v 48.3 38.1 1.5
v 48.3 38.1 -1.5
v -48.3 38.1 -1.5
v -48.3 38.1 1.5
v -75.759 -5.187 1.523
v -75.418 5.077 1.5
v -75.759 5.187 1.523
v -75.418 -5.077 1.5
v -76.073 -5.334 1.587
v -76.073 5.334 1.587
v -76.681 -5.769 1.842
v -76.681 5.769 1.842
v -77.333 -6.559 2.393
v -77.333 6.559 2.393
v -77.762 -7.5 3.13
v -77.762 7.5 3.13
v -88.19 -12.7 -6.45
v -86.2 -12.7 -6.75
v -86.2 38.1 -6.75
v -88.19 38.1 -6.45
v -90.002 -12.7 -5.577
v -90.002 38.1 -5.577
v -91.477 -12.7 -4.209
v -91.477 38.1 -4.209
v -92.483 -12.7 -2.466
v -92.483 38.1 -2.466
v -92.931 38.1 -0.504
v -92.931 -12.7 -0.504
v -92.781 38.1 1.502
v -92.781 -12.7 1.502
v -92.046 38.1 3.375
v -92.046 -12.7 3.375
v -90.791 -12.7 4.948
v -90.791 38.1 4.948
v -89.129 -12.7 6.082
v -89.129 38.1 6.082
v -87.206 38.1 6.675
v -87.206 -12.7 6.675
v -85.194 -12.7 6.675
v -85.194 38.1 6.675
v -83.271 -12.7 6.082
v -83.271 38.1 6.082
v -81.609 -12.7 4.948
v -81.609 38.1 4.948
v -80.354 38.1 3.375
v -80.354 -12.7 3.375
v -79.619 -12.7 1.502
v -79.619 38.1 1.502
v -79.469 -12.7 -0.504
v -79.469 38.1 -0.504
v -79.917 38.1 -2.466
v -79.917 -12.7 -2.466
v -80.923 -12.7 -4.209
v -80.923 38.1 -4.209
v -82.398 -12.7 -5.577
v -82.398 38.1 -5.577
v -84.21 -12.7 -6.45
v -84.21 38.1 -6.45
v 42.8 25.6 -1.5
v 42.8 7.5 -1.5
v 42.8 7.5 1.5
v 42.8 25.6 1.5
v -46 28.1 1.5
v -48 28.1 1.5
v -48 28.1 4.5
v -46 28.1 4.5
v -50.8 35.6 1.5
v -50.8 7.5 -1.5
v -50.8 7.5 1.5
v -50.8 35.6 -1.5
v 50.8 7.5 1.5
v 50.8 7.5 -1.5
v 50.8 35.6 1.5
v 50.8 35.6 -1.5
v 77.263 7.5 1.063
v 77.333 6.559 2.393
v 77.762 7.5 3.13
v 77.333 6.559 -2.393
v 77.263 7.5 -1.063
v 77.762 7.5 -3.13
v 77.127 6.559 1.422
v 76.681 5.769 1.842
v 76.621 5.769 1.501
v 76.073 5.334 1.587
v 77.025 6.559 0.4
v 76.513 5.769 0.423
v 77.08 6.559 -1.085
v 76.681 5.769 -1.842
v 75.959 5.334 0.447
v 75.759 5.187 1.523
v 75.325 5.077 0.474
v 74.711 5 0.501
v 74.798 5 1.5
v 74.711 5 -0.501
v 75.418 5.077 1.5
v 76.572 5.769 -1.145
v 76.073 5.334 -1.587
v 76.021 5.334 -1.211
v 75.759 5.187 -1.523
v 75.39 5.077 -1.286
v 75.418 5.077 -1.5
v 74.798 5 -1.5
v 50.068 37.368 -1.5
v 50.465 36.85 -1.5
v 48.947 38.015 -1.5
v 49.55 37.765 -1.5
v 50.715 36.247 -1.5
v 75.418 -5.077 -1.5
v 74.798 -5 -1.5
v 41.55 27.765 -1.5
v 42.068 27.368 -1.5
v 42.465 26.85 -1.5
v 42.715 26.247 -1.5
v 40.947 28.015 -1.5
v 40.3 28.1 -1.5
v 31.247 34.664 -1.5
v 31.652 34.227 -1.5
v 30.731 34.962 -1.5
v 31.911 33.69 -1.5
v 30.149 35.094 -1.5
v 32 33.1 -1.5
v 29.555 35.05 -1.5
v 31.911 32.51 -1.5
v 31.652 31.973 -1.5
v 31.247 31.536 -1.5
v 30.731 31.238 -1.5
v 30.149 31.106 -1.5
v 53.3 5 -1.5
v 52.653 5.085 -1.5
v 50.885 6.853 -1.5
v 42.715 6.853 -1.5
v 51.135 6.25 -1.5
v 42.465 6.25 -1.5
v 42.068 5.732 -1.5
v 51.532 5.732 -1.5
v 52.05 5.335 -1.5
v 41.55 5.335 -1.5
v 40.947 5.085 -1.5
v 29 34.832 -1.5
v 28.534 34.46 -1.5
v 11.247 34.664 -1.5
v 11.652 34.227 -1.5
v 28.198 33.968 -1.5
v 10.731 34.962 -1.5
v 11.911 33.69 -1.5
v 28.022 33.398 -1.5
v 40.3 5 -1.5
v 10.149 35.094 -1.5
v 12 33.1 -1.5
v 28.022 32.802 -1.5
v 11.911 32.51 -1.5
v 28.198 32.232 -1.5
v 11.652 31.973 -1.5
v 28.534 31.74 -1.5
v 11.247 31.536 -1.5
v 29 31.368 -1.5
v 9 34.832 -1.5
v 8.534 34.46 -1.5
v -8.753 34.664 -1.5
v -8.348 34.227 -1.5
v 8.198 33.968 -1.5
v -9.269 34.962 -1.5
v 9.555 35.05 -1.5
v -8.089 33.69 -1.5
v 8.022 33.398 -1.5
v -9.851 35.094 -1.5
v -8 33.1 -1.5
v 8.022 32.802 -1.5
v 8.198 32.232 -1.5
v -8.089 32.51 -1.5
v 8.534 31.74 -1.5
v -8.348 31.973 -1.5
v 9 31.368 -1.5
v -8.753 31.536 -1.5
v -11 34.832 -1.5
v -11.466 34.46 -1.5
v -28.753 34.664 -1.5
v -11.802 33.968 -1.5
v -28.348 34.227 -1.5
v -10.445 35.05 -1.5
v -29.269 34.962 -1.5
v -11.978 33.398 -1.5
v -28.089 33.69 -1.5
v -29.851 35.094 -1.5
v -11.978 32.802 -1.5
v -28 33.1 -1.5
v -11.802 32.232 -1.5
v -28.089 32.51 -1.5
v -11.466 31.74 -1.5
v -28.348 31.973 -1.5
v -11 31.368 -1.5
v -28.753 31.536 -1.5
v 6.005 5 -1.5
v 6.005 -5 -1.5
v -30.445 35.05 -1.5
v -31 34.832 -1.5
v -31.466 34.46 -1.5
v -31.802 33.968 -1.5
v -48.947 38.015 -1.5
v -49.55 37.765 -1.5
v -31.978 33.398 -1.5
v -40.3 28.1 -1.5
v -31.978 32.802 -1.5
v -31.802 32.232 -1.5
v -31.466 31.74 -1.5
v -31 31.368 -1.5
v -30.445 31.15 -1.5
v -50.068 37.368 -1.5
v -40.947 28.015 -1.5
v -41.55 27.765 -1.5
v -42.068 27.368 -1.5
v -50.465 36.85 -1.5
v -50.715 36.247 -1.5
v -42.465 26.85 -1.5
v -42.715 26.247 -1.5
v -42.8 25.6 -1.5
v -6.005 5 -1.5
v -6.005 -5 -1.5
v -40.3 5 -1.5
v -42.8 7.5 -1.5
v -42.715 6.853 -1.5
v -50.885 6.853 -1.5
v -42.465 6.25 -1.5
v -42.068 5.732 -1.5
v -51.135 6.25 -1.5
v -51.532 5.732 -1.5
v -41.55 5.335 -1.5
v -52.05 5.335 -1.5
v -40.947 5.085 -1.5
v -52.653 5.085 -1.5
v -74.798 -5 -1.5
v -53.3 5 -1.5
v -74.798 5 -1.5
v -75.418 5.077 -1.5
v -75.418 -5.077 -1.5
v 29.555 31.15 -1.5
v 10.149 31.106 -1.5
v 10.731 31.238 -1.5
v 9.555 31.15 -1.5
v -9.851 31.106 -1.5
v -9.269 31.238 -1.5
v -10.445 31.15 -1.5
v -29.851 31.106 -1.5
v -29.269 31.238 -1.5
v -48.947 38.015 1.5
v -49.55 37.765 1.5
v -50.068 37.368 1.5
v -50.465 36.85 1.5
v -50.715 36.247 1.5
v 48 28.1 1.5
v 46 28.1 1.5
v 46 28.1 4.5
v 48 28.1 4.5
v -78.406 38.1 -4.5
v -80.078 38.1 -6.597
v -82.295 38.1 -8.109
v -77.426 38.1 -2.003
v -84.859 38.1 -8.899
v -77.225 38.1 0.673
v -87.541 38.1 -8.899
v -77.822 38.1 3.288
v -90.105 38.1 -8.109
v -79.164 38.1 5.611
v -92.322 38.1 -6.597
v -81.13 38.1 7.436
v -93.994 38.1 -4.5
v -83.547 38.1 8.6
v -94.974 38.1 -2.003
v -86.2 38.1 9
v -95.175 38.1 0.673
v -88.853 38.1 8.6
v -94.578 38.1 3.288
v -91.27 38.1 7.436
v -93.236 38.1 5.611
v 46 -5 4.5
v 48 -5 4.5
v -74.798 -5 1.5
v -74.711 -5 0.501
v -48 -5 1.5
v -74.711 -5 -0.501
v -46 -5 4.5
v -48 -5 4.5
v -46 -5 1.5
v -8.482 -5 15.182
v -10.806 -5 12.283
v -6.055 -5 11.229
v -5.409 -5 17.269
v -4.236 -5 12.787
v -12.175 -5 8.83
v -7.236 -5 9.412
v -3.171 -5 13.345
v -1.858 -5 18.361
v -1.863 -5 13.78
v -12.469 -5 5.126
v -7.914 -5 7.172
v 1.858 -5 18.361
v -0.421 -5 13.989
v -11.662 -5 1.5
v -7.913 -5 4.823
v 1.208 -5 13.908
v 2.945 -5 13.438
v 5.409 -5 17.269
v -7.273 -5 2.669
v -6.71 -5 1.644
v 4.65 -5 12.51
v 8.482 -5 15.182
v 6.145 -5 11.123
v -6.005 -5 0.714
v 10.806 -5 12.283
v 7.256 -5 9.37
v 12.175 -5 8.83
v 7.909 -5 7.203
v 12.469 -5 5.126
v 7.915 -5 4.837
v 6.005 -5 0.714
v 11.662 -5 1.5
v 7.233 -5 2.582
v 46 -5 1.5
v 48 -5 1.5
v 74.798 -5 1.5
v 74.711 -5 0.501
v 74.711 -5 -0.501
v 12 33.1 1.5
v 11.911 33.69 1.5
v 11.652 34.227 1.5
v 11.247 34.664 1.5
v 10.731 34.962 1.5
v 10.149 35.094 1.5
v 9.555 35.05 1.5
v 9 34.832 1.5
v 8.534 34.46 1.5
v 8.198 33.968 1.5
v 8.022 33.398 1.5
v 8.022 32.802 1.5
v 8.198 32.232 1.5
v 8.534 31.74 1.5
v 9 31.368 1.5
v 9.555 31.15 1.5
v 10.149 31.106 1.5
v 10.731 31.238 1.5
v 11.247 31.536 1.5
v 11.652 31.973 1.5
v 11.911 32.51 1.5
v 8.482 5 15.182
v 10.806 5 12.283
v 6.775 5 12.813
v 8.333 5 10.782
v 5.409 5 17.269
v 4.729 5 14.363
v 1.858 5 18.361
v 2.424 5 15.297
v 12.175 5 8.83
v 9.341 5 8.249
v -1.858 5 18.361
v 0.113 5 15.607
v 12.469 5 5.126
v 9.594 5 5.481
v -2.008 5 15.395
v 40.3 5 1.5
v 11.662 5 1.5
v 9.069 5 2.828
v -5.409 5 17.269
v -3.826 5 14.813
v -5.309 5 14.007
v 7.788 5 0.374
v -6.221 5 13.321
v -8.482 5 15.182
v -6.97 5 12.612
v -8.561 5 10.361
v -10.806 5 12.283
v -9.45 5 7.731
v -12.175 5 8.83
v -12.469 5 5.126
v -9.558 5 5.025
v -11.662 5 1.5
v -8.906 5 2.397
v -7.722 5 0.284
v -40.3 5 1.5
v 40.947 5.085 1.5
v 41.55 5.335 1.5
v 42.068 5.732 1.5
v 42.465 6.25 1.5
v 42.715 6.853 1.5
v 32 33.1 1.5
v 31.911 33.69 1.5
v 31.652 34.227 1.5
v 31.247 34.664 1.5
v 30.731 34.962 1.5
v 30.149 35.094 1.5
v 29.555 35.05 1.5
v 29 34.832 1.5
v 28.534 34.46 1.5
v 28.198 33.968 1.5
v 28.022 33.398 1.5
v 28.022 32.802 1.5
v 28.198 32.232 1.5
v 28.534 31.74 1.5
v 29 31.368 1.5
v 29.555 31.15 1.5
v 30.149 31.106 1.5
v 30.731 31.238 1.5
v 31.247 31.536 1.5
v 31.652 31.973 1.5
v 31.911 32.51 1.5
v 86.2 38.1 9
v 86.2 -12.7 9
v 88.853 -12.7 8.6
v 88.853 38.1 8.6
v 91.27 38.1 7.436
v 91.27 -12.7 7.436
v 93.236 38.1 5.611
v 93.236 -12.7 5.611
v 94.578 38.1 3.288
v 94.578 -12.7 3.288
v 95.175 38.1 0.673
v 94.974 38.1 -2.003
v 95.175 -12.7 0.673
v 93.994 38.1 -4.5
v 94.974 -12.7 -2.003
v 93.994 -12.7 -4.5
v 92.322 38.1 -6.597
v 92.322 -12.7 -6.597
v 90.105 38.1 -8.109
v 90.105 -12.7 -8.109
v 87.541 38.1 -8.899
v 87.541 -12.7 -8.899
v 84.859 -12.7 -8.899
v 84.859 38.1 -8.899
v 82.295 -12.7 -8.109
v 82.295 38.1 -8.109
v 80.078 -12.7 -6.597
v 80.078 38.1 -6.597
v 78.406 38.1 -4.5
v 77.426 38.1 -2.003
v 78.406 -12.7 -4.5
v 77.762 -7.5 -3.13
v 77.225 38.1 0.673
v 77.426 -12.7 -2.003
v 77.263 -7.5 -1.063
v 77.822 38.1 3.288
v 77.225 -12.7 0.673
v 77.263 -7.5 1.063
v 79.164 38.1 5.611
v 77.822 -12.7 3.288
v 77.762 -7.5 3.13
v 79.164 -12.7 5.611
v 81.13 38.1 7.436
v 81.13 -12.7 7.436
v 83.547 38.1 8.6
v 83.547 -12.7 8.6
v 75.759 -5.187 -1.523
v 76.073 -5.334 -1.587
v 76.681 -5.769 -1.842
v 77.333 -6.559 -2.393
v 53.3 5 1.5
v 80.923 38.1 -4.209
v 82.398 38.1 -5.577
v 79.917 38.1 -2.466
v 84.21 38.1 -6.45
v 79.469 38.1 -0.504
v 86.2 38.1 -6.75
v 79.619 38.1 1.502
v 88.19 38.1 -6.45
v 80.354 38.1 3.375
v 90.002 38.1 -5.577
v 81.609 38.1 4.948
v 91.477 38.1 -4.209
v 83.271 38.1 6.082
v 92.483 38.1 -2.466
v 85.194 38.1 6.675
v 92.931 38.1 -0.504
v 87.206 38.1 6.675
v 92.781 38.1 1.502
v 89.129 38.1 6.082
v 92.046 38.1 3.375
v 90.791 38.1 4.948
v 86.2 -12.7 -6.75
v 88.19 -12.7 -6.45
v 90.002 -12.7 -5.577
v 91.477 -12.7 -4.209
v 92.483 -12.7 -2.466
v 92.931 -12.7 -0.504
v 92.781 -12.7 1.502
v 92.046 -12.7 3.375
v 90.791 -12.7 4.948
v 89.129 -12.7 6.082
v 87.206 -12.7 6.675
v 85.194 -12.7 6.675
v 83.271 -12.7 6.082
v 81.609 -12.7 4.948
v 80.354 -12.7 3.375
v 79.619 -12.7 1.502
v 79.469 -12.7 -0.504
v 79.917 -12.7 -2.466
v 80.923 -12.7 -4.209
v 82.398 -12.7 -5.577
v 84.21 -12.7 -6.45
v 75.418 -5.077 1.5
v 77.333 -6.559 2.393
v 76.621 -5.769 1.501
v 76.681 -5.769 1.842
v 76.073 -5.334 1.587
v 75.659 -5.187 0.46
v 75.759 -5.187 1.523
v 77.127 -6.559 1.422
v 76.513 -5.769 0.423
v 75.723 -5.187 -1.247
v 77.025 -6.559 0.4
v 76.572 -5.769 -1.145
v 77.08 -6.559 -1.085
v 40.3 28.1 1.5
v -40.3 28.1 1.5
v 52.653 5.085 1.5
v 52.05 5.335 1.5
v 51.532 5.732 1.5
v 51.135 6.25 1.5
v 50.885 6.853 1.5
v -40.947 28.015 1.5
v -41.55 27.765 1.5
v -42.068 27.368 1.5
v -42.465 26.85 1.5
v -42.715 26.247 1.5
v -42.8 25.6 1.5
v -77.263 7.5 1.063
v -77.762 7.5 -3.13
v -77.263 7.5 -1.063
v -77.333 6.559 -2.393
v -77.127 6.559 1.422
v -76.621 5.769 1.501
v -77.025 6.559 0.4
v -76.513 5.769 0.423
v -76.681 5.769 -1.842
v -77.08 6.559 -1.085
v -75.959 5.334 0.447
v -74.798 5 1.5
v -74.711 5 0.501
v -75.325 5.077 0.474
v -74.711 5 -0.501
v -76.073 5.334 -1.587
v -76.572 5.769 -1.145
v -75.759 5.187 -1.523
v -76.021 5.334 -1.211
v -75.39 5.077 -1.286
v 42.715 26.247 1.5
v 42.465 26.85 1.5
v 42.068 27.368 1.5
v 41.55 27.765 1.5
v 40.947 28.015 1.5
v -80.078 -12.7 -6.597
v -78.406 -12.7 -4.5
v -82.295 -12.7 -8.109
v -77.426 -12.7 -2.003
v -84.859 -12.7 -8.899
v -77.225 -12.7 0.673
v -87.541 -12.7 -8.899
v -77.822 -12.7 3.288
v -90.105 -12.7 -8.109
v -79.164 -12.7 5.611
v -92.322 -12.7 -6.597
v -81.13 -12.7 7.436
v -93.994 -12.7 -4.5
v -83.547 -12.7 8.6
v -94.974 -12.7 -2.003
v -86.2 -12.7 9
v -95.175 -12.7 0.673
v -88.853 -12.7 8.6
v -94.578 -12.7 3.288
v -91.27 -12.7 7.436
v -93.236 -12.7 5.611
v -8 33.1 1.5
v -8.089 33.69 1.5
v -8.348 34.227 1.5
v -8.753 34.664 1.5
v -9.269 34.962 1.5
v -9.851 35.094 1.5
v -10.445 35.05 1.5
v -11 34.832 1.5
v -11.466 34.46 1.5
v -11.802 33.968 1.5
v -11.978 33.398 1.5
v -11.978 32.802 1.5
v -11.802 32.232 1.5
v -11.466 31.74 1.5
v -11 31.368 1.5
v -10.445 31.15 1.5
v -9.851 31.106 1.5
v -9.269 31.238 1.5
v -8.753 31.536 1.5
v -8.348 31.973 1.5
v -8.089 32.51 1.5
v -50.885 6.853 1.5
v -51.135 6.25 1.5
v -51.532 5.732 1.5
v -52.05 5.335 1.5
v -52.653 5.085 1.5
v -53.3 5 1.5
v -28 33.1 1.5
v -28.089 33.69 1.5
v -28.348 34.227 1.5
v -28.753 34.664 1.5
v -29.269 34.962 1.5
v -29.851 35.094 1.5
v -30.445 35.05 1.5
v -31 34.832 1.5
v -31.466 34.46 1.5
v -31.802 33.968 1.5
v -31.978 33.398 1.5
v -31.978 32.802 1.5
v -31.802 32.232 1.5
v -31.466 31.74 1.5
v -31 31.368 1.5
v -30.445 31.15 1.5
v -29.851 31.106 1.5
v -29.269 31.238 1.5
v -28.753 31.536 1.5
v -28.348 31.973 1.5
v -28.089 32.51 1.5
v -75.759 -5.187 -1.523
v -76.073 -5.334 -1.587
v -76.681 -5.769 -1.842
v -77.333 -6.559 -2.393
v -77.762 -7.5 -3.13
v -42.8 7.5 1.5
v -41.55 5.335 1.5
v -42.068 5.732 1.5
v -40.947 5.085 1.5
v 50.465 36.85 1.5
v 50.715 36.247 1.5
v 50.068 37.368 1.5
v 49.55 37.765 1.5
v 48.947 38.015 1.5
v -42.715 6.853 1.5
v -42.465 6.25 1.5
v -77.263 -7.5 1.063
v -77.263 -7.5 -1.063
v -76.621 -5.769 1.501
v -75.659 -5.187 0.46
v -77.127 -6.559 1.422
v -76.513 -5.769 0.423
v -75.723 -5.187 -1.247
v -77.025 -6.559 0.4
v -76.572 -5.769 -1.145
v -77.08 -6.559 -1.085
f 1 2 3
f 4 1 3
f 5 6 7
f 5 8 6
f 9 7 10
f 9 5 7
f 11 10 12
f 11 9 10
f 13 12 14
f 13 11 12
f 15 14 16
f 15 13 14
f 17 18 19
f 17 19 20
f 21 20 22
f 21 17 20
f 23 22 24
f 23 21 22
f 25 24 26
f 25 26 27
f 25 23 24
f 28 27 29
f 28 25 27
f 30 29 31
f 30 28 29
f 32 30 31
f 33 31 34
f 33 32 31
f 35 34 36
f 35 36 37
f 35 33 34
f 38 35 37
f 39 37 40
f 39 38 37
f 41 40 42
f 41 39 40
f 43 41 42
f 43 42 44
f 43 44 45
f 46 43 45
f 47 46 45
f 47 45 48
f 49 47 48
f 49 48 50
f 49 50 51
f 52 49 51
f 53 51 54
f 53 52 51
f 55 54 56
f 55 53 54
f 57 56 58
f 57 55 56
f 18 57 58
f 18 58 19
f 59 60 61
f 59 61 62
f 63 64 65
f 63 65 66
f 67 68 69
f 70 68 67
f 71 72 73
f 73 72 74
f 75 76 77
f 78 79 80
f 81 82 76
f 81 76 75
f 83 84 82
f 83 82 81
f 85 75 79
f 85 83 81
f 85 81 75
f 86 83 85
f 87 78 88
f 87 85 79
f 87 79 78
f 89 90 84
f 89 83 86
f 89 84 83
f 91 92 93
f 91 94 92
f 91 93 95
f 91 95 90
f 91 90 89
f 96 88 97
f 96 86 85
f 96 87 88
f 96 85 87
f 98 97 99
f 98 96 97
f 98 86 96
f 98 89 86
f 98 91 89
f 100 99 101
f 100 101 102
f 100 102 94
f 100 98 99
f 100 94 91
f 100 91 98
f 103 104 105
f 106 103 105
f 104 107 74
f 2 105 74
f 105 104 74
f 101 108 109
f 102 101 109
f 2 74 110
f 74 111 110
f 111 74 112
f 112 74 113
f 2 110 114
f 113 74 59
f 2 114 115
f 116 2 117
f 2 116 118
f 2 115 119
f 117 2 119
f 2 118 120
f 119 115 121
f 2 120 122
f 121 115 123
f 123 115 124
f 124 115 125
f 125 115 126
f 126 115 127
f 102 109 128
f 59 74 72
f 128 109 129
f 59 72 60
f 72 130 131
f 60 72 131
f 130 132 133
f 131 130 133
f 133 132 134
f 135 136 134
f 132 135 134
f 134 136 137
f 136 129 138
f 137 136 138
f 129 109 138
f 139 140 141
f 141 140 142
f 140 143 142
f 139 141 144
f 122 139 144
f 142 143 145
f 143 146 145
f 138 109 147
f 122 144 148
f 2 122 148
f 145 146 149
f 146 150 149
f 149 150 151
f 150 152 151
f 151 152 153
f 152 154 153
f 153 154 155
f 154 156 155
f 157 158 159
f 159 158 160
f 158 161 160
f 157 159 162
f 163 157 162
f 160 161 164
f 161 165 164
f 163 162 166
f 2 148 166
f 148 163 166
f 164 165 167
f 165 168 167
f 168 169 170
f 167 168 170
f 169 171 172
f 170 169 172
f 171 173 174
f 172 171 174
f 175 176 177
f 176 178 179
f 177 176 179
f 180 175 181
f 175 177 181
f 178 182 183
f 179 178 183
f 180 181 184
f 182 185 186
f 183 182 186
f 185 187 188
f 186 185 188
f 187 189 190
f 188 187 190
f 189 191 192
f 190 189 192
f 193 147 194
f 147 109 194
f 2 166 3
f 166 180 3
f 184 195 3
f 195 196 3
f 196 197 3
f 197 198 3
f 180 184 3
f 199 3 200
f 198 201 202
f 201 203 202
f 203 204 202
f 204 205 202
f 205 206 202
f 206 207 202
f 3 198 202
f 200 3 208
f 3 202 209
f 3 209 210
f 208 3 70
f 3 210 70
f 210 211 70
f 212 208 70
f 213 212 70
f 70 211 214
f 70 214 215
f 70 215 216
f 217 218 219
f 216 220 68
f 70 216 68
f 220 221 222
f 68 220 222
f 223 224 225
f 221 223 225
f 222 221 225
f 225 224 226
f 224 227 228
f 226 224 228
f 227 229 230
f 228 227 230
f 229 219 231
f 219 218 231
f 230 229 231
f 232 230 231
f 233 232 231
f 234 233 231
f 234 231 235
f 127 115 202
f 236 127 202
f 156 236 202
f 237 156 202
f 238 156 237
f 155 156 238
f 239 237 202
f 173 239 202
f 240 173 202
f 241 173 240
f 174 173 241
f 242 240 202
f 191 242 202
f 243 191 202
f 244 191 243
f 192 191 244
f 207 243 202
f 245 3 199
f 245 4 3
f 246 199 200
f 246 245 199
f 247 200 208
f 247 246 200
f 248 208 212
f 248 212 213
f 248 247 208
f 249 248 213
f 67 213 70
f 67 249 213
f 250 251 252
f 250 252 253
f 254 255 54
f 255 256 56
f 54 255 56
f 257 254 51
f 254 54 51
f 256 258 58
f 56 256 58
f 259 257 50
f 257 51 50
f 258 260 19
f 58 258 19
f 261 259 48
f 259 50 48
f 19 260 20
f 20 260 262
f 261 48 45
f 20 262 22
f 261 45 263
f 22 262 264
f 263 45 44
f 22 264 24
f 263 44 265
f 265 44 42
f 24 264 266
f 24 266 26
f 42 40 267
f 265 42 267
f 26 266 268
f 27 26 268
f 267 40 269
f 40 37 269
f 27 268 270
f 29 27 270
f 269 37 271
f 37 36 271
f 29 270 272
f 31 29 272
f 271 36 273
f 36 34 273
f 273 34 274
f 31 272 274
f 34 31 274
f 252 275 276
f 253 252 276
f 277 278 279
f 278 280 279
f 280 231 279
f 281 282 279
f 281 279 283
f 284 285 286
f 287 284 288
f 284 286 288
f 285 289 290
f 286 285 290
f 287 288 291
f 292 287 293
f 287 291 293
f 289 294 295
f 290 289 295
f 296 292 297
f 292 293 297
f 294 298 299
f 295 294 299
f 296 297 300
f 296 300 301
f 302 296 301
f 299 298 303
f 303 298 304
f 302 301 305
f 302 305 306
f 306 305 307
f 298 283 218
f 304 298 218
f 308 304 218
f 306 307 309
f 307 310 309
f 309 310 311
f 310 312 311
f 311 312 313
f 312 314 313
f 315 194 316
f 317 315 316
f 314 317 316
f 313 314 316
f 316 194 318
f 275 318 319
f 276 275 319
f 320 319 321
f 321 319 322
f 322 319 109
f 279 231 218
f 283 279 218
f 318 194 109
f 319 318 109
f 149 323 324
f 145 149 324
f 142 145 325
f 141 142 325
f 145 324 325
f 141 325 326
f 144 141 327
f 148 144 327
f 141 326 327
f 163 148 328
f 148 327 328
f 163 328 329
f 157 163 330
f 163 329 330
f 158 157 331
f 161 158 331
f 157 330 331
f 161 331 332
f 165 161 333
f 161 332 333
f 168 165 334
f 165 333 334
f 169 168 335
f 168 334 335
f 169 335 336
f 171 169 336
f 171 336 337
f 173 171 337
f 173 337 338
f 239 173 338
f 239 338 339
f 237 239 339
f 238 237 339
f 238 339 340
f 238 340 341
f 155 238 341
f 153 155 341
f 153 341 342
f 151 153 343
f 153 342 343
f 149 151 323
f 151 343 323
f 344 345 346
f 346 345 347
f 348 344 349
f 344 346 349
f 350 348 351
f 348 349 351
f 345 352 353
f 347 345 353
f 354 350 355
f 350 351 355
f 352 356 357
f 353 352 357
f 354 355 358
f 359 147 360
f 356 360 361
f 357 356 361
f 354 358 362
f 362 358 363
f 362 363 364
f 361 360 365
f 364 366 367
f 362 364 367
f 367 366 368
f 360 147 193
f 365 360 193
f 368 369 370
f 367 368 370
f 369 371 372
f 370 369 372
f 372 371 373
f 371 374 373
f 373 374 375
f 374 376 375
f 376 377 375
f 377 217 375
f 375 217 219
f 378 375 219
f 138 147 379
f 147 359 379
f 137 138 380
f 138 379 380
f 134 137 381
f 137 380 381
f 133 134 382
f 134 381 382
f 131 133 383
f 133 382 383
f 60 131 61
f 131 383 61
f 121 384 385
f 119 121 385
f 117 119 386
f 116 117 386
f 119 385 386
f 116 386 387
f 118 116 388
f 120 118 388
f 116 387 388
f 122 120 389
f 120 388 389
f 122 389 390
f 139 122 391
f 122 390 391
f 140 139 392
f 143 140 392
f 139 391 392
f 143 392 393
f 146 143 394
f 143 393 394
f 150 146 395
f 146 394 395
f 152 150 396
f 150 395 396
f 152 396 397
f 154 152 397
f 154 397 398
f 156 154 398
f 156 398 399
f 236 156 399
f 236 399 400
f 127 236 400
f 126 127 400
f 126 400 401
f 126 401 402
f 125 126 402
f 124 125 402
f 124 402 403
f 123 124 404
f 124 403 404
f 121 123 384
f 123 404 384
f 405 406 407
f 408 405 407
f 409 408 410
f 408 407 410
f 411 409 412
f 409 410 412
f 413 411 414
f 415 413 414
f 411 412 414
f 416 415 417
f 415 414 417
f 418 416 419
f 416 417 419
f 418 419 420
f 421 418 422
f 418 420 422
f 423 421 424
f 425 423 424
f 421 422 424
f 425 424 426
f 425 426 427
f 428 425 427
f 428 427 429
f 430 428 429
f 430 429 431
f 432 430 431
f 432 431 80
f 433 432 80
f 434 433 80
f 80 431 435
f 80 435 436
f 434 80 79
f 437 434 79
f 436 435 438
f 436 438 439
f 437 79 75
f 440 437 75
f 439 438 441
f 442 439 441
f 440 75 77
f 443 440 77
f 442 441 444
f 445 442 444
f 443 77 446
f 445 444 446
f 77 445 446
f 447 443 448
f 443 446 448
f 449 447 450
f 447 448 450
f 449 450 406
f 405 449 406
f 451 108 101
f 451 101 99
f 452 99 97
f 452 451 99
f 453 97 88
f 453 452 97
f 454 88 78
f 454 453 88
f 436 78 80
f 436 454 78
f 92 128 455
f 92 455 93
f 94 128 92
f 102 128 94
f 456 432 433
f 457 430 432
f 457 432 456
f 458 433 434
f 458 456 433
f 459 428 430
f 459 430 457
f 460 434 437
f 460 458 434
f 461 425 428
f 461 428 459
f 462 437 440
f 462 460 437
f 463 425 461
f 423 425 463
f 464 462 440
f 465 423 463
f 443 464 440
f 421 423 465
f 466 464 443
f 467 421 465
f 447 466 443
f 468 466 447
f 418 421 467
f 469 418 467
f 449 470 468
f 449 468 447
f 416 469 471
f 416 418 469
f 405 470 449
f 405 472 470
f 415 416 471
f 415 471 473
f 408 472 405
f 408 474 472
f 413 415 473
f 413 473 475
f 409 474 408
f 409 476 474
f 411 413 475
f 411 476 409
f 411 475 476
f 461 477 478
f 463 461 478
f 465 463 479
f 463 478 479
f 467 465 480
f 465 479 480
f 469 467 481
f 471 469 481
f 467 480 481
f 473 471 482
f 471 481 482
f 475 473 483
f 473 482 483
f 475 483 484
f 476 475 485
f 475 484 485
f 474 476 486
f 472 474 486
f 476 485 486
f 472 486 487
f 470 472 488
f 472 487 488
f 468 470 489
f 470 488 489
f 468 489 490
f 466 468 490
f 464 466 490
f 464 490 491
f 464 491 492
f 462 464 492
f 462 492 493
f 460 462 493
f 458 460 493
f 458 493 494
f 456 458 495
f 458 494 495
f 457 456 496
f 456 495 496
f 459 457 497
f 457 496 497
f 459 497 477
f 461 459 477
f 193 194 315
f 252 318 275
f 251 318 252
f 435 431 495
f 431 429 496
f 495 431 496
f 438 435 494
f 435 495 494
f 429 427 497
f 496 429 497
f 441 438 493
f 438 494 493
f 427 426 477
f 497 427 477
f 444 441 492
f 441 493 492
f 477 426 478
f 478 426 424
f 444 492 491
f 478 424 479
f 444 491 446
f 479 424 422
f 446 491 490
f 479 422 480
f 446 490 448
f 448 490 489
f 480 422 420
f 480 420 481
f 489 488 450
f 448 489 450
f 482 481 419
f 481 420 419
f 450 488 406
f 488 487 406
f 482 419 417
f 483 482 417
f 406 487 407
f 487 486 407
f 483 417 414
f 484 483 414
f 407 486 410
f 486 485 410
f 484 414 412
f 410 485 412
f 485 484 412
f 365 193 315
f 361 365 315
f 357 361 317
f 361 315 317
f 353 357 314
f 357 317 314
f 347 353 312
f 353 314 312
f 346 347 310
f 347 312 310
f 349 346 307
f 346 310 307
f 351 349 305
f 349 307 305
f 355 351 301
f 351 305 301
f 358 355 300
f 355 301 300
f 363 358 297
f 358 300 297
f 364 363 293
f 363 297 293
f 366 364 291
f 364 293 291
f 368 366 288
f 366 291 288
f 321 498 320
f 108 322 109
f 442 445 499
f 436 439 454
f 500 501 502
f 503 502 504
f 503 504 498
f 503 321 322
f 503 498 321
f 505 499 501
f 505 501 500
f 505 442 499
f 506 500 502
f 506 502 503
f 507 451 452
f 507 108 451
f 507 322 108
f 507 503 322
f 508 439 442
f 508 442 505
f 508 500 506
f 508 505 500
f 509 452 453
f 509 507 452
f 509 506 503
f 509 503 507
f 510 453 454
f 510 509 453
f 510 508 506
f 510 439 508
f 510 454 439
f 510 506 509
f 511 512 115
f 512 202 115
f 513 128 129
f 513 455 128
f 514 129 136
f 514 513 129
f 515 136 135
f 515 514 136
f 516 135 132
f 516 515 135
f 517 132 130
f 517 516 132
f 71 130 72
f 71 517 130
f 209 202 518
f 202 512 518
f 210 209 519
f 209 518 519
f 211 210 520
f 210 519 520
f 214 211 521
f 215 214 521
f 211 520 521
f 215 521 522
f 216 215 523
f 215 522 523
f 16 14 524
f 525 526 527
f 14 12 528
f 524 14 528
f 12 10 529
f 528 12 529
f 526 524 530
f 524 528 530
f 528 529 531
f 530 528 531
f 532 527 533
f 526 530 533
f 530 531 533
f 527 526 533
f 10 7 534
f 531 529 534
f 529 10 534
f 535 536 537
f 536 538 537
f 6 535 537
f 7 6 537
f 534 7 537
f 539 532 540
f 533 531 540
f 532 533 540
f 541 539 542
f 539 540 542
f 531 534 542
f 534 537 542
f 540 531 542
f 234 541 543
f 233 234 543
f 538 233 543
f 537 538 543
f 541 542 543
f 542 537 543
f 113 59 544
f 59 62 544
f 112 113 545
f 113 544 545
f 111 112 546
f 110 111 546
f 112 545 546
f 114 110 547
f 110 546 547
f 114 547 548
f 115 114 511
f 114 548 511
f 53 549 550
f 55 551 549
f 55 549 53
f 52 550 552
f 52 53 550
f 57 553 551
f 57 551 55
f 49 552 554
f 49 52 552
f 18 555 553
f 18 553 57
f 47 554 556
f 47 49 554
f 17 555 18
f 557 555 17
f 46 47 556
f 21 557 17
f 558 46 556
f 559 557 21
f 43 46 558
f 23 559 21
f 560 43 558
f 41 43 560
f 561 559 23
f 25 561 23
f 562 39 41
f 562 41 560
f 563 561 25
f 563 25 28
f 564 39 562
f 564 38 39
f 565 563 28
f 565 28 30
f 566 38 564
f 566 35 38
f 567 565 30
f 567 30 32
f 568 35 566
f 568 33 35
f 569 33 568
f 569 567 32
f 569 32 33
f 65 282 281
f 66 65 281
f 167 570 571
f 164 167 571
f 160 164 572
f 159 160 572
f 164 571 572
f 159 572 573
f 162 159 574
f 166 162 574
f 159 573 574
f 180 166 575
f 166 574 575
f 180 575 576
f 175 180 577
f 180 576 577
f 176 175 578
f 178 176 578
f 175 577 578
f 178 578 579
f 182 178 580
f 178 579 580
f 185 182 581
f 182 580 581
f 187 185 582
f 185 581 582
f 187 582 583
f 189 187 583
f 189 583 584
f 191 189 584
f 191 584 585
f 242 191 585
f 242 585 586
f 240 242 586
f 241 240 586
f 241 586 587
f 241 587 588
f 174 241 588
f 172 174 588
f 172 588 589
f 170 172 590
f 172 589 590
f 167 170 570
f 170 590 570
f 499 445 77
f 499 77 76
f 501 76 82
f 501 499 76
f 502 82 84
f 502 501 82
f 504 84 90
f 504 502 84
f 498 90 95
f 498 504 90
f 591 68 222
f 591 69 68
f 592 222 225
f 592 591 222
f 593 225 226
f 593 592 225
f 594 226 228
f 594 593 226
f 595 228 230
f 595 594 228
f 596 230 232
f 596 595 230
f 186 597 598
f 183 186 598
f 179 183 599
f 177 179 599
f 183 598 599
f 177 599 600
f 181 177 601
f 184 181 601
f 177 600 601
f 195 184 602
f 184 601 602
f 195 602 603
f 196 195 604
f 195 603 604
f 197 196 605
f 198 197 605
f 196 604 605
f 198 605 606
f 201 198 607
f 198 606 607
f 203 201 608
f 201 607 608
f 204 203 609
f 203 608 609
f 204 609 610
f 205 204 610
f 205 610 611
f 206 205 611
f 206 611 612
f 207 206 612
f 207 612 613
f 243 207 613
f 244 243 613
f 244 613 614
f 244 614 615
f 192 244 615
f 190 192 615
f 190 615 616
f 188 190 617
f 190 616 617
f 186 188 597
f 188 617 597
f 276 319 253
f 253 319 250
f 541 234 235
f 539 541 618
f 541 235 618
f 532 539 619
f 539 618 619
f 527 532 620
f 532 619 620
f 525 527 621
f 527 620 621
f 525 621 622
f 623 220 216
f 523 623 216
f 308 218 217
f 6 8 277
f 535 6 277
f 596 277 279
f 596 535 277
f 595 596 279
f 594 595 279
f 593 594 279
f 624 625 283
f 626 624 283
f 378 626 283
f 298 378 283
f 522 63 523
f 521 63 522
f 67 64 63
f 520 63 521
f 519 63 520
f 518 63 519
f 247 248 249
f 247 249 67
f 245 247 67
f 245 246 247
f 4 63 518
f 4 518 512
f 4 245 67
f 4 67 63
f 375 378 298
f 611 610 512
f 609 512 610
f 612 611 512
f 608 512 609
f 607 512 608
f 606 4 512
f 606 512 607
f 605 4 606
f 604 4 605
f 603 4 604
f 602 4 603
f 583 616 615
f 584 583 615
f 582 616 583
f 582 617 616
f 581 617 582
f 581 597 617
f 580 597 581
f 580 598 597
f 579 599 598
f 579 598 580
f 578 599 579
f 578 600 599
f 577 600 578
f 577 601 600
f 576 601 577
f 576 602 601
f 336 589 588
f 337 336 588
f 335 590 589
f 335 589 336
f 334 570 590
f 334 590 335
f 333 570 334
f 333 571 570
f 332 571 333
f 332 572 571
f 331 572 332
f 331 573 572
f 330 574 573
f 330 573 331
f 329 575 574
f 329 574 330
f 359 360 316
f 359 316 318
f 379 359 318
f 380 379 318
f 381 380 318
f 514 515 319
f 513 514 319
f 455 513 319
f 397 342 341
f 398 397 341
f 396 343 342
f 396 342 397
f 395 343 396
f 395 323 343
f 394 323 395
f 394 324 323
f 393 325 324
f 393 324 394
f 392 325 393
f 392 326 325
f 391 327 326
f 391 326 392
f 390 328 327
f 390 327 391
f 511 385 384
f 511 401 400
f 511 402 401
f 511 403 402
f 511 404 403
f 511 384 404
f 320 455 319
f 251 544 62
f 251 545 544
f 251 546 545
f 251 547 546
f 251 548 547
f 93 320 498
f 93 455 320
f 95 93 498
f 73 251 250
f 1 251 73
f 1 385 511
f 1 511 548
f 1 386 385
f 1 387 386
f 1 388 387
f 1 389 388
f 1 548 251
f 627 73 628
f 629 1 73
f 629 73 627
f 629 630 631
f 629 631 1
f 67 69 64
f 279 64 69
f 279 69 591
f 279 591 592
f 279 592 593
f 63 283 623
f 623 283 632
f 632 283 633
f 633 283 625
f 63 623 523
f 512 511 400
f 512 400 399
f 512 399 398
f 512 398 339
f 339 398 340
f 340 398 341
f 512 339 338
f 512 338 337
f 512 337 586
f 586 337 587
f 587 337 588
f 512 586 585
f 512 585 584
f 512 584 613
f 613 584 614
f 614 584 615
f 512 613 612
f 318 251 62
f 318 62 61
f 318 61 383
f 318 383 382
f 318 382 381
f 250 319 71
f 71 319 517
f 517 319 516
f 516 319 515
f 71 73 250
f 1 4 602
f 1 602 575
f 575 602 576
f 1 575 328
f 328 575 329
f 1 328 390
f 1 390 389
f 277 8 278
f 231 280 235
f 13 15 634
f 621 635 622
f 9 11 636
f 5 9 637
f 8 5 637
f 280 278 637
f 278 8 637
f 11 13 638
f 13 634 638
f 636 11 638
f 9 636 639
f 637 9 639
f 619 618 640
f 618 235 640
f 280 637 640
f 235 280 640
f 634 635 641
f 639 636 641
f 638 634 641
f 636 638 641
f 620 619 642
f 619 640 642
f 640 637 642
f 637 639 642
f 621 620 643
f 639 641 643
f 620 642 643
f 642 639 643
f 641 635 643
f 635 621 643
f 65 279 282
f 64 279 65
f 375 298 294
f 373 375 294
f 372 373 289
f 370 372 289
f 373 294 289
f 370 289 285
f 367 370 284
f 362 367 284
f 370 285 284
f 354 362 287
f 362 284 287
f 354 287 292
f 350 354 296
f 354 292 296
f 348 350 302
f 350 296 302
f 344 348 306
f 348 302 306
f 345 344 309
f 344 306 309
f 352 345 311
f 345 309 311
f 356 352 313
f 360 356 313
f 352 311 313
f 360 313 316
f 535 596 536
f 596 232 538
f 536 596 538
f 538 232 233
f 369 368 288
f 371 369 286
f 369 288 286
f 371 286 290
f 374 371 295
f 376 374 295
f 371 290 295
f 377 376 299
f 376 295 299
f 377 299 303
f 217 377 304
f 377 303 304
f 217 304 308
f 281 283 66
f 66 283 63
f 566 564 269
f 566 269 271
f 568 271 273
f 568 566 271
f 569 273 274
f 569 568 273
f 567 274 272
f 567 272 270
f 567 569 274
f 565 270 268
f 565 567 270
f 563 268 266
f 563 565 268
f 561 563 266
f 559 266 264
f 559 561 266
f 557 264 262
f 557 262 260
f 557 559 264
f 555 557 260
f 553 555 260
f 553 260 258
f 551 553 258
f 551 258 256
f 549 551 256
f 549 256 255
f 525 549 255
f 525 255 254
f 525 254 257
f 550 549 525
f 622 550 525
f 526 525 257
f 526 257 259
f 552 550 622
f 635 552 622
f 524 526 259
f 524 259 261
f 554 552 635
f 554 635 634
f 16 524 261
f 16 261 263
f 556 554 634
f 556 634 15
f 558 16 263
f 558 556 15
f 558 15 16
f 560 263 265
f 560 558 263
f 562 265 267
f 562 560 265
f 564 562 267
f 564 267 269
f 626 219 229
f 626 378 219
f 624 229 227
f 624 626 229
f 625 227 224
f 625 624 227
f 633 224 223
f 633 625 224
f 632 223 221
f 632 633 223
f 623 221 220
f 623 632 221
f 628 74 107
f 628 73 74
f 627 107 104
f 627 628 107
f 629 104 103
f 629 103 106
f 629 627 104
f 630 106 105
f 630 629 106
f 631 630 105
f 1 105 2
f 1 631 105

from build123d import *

# Parameters (mm, degrees)
BOSS_EXTRUDE1_DEPTH      = 38.1
BOSS_EXTRUDE1_DEPTH_BACK = 12.7
SKETCH1_R                = 9
SKETCH2_R                = 6.75
CUT_EXTRUDE1_DEPTH       = 50.8
BOSS_EXTRUDE2_DEPTH      = 1.5
BOSS_EXTRUDE2_DEPTH_BACK = 1.5
BOSS_EXTRUDE3_DEPTH      = 10
SKETCH9_W                = 12.009184536
SKETCH9_H                = 15.938825618
CUT_EXTRUDE2_DEPTH       = 3
SKETCH10_R               = 2
CUT_EXTRUDE3_DEPTH       = 3
SKETCH11_W               = 2
SKETCH11_H               = 33.1
BOSS_EXTRUDE4_DEPTH      = 3
FILLET1_R                = 2.5


with BuildPart() as part:
    # Sketch1 → Boss-Extrude1 (new, two sides: drawn at the far end of the back side and taken through both)
    with BuildSketch(Plane(origin=(0, 0, 0), x_dir=(1, 0, 0), z_dir=(0, 1, 0)).offset(-BOSS_EXTRUDE1_DEPTH_BACK)):
        with Locations(Location((86.2, 0, 0), (0, 0, 270))):
            Circle(SKETCH1_R)
    extrude(amount=BOSS_EXTRUDE1_DEPTH + BOSS_EXTRUDE1_DEPTH_BACK)

    # Sketch2 → Cut-Extrude1 (cut)
    with BuildSketch(Plane(origin=(0, -12.7, 0), x_dir=(-1, 0, 0), z_dir=(0, -1, 0))):
        with Locations(Location((-86.2, 0, 0), (0, 0, 90))):
            Circle(SKETCH2_R)
    extrude(amount=-CUT_EXTRUDE1_DEPTH, mode=Mode.SUBTRACT)

    # Sketch4 → Boss-Extrude2 (add, two sides: drawn at the far end of the back side and taken through both)
    with BuildSketch(Plane.XY.offset(-BOSS_EXTRUDE2_DEPTH_BACK)):
        Polygon((77.5, -5), (0, -5), (0, 5), (42.8, 5), (42.8, 28.1), (0, 28.1), (0, 38.1), (50.8, 38.1), (50.8, 28.1), (50.8, 5), (77.5, 5), align=None)
    extrude(amount=BOSS_EXTRUDE2_DEPTH + BOSS_EXTRUDE2_DEPTH_BACK)

    # Mirror2: part across plane


with BuildPart() as part_1:
    add(part.part)
    add(part.part.mirror(Plane(origin=(0, 38.1, -1.5), x_dir=(0, 0, 1), z_dir=(-1, 0, 0))))

    # Sketch6 → Boss-Extrude3 (add)
    with BuildSketch(Plane.XZ.offset(5)):
        with BuildLine():
            Line((10, -1.5), (-10, -1.5))
            ThreePointArc((-10, -1.5), (0, 18.5), (10, -1.5))
        make_face()
    extrude(amount=-BOSS_EXTRUDE3_DEPTH)

    # Cut-Loft1: read off the stored shape, not the designer's step
    # Cut-Loft1: loft between two sections, ruled curve by curve
    cut_loft1_from = [
        Edge.make_bspline([(-6.970459828, 5, 12.611945372), (-20.194350572, 5, -1.328974284), (-6.253430916, 5, -14.552865027), (6.970459828, 5, -0.611945372), (20.194350572, 5, 13.328974284), (6.253430916, 5, 26.552865027), (-6.970459828, 5, 12.611945372)], [0, 0, 0, 0, 0.5, 0.5, 0.5, 1, 1, 1, 1], 3, [1, 0.333333333, 0.333333333, 1, 0.333333333, 0.333333333, 1]),
    ]
    cut_loft1_to = [
        Edge.make_bspline([(-4.235564338, -5, 12.786751413), (-17.809067164, -5, 4.315622738), (-9.337938488, -5, -9.257880088), (4.235564338, -5, -0.786751413), (17.809067164, -5, 7.684377262), (9.337938488, -5, 21.257880088), (-4.235564338, -5, 12.786751413)], [0, 0, 0, 0, 0.5, 0.5, 0.5, 1, 1, 1, 1], 3, [1, 0.333333333, 0.333333333, 1, 0.333333333, 0.333333333, 1]),
    ]
    cut_loft1 = Solid(Shell([*[Face.make_surface_from_curves(cut_loft1_from[k], cut_loft1_to[k]) for k in range(1)], Face(Wire(cut_loft1_from)), Face(Wire(cut_loft1_to))]))
    add(cut_loft1, mode=Mode.SUBTRACT)

    # Sketch9 → Cut-Extrude2 (cut)
    with BuildSketch(Plane(origin=(0, 0, -1.5), x_dir=(-1, 0, 0), z_dir=(0, 0, -1))):
        with Locations((-2.92e-07, -2.969412809)):
            Rectangle(SKETCH9_W, SKETCH9_H)
    extrude(amount=-CUT_EXTRUDE2_DEPTH, mode=Mode.SUBTRACT)

    # Sketch10 → Cut-Extrude3 (cut)
    with BuildSketch(Plane.XY.offset(1.5)):
        with Locations((-30, 33.1)):
            Circle(SKETCH10_R)
        with Locations((-10, 33.1)):
            Circle(SKETCH10_R)
        with Locations((10, 33.1)):
            Circle(SKETCH10_R)
        with Locations((30, 33.1)):
            Circle(SKETCH10_R)
    extrude(amount=-CUT_EXTRUDE3_DEPTH, mode=Mode.SUBTRACT)

    # Sketch11 → Boss-Extrude4 (add)
    with BuildSketch(Plane.XY.offset(1.5)):
        with Locations((-47, 11.55)):
            Rectangle(SKETCH11_W, SKETCH11_H)
        with Locations((47, 11.55)):
            Rectangle(SKETCH11_W, SKETCH11_H)
    extrude(amount=BOSS_EXTRUDE4_DEPTH)

    # Fillet1
    fillet1_edges = [part_1.edges().sort_by_distance(p)[0] for p in [
        (50.8, 5, 0),
        (-50.8, 5, 0),
        (-42.8, 5, 0),
        (-42.8, 28.1, 0),
        (42.8, 5, 0),
        (42.8, 28.1, 0),
        (-77.325880325, 0, -1.5),
        (-77.325880325, 0, 1.5),
        (-77.2, -5, 0),
        (-77.2, 5, 0),
        (77.325880325, 0, -1.5),
        (77.2, -5, 0),
        (77.325880325, 0, 1.5),
        (77.2, 5, 0),
        (50.8, 38.1, 0),
        (-50.8, 38.1, 0),
    ]]
    fillet(fillet1_edges, radius=FILLET1_R)


solid = part_1.part
